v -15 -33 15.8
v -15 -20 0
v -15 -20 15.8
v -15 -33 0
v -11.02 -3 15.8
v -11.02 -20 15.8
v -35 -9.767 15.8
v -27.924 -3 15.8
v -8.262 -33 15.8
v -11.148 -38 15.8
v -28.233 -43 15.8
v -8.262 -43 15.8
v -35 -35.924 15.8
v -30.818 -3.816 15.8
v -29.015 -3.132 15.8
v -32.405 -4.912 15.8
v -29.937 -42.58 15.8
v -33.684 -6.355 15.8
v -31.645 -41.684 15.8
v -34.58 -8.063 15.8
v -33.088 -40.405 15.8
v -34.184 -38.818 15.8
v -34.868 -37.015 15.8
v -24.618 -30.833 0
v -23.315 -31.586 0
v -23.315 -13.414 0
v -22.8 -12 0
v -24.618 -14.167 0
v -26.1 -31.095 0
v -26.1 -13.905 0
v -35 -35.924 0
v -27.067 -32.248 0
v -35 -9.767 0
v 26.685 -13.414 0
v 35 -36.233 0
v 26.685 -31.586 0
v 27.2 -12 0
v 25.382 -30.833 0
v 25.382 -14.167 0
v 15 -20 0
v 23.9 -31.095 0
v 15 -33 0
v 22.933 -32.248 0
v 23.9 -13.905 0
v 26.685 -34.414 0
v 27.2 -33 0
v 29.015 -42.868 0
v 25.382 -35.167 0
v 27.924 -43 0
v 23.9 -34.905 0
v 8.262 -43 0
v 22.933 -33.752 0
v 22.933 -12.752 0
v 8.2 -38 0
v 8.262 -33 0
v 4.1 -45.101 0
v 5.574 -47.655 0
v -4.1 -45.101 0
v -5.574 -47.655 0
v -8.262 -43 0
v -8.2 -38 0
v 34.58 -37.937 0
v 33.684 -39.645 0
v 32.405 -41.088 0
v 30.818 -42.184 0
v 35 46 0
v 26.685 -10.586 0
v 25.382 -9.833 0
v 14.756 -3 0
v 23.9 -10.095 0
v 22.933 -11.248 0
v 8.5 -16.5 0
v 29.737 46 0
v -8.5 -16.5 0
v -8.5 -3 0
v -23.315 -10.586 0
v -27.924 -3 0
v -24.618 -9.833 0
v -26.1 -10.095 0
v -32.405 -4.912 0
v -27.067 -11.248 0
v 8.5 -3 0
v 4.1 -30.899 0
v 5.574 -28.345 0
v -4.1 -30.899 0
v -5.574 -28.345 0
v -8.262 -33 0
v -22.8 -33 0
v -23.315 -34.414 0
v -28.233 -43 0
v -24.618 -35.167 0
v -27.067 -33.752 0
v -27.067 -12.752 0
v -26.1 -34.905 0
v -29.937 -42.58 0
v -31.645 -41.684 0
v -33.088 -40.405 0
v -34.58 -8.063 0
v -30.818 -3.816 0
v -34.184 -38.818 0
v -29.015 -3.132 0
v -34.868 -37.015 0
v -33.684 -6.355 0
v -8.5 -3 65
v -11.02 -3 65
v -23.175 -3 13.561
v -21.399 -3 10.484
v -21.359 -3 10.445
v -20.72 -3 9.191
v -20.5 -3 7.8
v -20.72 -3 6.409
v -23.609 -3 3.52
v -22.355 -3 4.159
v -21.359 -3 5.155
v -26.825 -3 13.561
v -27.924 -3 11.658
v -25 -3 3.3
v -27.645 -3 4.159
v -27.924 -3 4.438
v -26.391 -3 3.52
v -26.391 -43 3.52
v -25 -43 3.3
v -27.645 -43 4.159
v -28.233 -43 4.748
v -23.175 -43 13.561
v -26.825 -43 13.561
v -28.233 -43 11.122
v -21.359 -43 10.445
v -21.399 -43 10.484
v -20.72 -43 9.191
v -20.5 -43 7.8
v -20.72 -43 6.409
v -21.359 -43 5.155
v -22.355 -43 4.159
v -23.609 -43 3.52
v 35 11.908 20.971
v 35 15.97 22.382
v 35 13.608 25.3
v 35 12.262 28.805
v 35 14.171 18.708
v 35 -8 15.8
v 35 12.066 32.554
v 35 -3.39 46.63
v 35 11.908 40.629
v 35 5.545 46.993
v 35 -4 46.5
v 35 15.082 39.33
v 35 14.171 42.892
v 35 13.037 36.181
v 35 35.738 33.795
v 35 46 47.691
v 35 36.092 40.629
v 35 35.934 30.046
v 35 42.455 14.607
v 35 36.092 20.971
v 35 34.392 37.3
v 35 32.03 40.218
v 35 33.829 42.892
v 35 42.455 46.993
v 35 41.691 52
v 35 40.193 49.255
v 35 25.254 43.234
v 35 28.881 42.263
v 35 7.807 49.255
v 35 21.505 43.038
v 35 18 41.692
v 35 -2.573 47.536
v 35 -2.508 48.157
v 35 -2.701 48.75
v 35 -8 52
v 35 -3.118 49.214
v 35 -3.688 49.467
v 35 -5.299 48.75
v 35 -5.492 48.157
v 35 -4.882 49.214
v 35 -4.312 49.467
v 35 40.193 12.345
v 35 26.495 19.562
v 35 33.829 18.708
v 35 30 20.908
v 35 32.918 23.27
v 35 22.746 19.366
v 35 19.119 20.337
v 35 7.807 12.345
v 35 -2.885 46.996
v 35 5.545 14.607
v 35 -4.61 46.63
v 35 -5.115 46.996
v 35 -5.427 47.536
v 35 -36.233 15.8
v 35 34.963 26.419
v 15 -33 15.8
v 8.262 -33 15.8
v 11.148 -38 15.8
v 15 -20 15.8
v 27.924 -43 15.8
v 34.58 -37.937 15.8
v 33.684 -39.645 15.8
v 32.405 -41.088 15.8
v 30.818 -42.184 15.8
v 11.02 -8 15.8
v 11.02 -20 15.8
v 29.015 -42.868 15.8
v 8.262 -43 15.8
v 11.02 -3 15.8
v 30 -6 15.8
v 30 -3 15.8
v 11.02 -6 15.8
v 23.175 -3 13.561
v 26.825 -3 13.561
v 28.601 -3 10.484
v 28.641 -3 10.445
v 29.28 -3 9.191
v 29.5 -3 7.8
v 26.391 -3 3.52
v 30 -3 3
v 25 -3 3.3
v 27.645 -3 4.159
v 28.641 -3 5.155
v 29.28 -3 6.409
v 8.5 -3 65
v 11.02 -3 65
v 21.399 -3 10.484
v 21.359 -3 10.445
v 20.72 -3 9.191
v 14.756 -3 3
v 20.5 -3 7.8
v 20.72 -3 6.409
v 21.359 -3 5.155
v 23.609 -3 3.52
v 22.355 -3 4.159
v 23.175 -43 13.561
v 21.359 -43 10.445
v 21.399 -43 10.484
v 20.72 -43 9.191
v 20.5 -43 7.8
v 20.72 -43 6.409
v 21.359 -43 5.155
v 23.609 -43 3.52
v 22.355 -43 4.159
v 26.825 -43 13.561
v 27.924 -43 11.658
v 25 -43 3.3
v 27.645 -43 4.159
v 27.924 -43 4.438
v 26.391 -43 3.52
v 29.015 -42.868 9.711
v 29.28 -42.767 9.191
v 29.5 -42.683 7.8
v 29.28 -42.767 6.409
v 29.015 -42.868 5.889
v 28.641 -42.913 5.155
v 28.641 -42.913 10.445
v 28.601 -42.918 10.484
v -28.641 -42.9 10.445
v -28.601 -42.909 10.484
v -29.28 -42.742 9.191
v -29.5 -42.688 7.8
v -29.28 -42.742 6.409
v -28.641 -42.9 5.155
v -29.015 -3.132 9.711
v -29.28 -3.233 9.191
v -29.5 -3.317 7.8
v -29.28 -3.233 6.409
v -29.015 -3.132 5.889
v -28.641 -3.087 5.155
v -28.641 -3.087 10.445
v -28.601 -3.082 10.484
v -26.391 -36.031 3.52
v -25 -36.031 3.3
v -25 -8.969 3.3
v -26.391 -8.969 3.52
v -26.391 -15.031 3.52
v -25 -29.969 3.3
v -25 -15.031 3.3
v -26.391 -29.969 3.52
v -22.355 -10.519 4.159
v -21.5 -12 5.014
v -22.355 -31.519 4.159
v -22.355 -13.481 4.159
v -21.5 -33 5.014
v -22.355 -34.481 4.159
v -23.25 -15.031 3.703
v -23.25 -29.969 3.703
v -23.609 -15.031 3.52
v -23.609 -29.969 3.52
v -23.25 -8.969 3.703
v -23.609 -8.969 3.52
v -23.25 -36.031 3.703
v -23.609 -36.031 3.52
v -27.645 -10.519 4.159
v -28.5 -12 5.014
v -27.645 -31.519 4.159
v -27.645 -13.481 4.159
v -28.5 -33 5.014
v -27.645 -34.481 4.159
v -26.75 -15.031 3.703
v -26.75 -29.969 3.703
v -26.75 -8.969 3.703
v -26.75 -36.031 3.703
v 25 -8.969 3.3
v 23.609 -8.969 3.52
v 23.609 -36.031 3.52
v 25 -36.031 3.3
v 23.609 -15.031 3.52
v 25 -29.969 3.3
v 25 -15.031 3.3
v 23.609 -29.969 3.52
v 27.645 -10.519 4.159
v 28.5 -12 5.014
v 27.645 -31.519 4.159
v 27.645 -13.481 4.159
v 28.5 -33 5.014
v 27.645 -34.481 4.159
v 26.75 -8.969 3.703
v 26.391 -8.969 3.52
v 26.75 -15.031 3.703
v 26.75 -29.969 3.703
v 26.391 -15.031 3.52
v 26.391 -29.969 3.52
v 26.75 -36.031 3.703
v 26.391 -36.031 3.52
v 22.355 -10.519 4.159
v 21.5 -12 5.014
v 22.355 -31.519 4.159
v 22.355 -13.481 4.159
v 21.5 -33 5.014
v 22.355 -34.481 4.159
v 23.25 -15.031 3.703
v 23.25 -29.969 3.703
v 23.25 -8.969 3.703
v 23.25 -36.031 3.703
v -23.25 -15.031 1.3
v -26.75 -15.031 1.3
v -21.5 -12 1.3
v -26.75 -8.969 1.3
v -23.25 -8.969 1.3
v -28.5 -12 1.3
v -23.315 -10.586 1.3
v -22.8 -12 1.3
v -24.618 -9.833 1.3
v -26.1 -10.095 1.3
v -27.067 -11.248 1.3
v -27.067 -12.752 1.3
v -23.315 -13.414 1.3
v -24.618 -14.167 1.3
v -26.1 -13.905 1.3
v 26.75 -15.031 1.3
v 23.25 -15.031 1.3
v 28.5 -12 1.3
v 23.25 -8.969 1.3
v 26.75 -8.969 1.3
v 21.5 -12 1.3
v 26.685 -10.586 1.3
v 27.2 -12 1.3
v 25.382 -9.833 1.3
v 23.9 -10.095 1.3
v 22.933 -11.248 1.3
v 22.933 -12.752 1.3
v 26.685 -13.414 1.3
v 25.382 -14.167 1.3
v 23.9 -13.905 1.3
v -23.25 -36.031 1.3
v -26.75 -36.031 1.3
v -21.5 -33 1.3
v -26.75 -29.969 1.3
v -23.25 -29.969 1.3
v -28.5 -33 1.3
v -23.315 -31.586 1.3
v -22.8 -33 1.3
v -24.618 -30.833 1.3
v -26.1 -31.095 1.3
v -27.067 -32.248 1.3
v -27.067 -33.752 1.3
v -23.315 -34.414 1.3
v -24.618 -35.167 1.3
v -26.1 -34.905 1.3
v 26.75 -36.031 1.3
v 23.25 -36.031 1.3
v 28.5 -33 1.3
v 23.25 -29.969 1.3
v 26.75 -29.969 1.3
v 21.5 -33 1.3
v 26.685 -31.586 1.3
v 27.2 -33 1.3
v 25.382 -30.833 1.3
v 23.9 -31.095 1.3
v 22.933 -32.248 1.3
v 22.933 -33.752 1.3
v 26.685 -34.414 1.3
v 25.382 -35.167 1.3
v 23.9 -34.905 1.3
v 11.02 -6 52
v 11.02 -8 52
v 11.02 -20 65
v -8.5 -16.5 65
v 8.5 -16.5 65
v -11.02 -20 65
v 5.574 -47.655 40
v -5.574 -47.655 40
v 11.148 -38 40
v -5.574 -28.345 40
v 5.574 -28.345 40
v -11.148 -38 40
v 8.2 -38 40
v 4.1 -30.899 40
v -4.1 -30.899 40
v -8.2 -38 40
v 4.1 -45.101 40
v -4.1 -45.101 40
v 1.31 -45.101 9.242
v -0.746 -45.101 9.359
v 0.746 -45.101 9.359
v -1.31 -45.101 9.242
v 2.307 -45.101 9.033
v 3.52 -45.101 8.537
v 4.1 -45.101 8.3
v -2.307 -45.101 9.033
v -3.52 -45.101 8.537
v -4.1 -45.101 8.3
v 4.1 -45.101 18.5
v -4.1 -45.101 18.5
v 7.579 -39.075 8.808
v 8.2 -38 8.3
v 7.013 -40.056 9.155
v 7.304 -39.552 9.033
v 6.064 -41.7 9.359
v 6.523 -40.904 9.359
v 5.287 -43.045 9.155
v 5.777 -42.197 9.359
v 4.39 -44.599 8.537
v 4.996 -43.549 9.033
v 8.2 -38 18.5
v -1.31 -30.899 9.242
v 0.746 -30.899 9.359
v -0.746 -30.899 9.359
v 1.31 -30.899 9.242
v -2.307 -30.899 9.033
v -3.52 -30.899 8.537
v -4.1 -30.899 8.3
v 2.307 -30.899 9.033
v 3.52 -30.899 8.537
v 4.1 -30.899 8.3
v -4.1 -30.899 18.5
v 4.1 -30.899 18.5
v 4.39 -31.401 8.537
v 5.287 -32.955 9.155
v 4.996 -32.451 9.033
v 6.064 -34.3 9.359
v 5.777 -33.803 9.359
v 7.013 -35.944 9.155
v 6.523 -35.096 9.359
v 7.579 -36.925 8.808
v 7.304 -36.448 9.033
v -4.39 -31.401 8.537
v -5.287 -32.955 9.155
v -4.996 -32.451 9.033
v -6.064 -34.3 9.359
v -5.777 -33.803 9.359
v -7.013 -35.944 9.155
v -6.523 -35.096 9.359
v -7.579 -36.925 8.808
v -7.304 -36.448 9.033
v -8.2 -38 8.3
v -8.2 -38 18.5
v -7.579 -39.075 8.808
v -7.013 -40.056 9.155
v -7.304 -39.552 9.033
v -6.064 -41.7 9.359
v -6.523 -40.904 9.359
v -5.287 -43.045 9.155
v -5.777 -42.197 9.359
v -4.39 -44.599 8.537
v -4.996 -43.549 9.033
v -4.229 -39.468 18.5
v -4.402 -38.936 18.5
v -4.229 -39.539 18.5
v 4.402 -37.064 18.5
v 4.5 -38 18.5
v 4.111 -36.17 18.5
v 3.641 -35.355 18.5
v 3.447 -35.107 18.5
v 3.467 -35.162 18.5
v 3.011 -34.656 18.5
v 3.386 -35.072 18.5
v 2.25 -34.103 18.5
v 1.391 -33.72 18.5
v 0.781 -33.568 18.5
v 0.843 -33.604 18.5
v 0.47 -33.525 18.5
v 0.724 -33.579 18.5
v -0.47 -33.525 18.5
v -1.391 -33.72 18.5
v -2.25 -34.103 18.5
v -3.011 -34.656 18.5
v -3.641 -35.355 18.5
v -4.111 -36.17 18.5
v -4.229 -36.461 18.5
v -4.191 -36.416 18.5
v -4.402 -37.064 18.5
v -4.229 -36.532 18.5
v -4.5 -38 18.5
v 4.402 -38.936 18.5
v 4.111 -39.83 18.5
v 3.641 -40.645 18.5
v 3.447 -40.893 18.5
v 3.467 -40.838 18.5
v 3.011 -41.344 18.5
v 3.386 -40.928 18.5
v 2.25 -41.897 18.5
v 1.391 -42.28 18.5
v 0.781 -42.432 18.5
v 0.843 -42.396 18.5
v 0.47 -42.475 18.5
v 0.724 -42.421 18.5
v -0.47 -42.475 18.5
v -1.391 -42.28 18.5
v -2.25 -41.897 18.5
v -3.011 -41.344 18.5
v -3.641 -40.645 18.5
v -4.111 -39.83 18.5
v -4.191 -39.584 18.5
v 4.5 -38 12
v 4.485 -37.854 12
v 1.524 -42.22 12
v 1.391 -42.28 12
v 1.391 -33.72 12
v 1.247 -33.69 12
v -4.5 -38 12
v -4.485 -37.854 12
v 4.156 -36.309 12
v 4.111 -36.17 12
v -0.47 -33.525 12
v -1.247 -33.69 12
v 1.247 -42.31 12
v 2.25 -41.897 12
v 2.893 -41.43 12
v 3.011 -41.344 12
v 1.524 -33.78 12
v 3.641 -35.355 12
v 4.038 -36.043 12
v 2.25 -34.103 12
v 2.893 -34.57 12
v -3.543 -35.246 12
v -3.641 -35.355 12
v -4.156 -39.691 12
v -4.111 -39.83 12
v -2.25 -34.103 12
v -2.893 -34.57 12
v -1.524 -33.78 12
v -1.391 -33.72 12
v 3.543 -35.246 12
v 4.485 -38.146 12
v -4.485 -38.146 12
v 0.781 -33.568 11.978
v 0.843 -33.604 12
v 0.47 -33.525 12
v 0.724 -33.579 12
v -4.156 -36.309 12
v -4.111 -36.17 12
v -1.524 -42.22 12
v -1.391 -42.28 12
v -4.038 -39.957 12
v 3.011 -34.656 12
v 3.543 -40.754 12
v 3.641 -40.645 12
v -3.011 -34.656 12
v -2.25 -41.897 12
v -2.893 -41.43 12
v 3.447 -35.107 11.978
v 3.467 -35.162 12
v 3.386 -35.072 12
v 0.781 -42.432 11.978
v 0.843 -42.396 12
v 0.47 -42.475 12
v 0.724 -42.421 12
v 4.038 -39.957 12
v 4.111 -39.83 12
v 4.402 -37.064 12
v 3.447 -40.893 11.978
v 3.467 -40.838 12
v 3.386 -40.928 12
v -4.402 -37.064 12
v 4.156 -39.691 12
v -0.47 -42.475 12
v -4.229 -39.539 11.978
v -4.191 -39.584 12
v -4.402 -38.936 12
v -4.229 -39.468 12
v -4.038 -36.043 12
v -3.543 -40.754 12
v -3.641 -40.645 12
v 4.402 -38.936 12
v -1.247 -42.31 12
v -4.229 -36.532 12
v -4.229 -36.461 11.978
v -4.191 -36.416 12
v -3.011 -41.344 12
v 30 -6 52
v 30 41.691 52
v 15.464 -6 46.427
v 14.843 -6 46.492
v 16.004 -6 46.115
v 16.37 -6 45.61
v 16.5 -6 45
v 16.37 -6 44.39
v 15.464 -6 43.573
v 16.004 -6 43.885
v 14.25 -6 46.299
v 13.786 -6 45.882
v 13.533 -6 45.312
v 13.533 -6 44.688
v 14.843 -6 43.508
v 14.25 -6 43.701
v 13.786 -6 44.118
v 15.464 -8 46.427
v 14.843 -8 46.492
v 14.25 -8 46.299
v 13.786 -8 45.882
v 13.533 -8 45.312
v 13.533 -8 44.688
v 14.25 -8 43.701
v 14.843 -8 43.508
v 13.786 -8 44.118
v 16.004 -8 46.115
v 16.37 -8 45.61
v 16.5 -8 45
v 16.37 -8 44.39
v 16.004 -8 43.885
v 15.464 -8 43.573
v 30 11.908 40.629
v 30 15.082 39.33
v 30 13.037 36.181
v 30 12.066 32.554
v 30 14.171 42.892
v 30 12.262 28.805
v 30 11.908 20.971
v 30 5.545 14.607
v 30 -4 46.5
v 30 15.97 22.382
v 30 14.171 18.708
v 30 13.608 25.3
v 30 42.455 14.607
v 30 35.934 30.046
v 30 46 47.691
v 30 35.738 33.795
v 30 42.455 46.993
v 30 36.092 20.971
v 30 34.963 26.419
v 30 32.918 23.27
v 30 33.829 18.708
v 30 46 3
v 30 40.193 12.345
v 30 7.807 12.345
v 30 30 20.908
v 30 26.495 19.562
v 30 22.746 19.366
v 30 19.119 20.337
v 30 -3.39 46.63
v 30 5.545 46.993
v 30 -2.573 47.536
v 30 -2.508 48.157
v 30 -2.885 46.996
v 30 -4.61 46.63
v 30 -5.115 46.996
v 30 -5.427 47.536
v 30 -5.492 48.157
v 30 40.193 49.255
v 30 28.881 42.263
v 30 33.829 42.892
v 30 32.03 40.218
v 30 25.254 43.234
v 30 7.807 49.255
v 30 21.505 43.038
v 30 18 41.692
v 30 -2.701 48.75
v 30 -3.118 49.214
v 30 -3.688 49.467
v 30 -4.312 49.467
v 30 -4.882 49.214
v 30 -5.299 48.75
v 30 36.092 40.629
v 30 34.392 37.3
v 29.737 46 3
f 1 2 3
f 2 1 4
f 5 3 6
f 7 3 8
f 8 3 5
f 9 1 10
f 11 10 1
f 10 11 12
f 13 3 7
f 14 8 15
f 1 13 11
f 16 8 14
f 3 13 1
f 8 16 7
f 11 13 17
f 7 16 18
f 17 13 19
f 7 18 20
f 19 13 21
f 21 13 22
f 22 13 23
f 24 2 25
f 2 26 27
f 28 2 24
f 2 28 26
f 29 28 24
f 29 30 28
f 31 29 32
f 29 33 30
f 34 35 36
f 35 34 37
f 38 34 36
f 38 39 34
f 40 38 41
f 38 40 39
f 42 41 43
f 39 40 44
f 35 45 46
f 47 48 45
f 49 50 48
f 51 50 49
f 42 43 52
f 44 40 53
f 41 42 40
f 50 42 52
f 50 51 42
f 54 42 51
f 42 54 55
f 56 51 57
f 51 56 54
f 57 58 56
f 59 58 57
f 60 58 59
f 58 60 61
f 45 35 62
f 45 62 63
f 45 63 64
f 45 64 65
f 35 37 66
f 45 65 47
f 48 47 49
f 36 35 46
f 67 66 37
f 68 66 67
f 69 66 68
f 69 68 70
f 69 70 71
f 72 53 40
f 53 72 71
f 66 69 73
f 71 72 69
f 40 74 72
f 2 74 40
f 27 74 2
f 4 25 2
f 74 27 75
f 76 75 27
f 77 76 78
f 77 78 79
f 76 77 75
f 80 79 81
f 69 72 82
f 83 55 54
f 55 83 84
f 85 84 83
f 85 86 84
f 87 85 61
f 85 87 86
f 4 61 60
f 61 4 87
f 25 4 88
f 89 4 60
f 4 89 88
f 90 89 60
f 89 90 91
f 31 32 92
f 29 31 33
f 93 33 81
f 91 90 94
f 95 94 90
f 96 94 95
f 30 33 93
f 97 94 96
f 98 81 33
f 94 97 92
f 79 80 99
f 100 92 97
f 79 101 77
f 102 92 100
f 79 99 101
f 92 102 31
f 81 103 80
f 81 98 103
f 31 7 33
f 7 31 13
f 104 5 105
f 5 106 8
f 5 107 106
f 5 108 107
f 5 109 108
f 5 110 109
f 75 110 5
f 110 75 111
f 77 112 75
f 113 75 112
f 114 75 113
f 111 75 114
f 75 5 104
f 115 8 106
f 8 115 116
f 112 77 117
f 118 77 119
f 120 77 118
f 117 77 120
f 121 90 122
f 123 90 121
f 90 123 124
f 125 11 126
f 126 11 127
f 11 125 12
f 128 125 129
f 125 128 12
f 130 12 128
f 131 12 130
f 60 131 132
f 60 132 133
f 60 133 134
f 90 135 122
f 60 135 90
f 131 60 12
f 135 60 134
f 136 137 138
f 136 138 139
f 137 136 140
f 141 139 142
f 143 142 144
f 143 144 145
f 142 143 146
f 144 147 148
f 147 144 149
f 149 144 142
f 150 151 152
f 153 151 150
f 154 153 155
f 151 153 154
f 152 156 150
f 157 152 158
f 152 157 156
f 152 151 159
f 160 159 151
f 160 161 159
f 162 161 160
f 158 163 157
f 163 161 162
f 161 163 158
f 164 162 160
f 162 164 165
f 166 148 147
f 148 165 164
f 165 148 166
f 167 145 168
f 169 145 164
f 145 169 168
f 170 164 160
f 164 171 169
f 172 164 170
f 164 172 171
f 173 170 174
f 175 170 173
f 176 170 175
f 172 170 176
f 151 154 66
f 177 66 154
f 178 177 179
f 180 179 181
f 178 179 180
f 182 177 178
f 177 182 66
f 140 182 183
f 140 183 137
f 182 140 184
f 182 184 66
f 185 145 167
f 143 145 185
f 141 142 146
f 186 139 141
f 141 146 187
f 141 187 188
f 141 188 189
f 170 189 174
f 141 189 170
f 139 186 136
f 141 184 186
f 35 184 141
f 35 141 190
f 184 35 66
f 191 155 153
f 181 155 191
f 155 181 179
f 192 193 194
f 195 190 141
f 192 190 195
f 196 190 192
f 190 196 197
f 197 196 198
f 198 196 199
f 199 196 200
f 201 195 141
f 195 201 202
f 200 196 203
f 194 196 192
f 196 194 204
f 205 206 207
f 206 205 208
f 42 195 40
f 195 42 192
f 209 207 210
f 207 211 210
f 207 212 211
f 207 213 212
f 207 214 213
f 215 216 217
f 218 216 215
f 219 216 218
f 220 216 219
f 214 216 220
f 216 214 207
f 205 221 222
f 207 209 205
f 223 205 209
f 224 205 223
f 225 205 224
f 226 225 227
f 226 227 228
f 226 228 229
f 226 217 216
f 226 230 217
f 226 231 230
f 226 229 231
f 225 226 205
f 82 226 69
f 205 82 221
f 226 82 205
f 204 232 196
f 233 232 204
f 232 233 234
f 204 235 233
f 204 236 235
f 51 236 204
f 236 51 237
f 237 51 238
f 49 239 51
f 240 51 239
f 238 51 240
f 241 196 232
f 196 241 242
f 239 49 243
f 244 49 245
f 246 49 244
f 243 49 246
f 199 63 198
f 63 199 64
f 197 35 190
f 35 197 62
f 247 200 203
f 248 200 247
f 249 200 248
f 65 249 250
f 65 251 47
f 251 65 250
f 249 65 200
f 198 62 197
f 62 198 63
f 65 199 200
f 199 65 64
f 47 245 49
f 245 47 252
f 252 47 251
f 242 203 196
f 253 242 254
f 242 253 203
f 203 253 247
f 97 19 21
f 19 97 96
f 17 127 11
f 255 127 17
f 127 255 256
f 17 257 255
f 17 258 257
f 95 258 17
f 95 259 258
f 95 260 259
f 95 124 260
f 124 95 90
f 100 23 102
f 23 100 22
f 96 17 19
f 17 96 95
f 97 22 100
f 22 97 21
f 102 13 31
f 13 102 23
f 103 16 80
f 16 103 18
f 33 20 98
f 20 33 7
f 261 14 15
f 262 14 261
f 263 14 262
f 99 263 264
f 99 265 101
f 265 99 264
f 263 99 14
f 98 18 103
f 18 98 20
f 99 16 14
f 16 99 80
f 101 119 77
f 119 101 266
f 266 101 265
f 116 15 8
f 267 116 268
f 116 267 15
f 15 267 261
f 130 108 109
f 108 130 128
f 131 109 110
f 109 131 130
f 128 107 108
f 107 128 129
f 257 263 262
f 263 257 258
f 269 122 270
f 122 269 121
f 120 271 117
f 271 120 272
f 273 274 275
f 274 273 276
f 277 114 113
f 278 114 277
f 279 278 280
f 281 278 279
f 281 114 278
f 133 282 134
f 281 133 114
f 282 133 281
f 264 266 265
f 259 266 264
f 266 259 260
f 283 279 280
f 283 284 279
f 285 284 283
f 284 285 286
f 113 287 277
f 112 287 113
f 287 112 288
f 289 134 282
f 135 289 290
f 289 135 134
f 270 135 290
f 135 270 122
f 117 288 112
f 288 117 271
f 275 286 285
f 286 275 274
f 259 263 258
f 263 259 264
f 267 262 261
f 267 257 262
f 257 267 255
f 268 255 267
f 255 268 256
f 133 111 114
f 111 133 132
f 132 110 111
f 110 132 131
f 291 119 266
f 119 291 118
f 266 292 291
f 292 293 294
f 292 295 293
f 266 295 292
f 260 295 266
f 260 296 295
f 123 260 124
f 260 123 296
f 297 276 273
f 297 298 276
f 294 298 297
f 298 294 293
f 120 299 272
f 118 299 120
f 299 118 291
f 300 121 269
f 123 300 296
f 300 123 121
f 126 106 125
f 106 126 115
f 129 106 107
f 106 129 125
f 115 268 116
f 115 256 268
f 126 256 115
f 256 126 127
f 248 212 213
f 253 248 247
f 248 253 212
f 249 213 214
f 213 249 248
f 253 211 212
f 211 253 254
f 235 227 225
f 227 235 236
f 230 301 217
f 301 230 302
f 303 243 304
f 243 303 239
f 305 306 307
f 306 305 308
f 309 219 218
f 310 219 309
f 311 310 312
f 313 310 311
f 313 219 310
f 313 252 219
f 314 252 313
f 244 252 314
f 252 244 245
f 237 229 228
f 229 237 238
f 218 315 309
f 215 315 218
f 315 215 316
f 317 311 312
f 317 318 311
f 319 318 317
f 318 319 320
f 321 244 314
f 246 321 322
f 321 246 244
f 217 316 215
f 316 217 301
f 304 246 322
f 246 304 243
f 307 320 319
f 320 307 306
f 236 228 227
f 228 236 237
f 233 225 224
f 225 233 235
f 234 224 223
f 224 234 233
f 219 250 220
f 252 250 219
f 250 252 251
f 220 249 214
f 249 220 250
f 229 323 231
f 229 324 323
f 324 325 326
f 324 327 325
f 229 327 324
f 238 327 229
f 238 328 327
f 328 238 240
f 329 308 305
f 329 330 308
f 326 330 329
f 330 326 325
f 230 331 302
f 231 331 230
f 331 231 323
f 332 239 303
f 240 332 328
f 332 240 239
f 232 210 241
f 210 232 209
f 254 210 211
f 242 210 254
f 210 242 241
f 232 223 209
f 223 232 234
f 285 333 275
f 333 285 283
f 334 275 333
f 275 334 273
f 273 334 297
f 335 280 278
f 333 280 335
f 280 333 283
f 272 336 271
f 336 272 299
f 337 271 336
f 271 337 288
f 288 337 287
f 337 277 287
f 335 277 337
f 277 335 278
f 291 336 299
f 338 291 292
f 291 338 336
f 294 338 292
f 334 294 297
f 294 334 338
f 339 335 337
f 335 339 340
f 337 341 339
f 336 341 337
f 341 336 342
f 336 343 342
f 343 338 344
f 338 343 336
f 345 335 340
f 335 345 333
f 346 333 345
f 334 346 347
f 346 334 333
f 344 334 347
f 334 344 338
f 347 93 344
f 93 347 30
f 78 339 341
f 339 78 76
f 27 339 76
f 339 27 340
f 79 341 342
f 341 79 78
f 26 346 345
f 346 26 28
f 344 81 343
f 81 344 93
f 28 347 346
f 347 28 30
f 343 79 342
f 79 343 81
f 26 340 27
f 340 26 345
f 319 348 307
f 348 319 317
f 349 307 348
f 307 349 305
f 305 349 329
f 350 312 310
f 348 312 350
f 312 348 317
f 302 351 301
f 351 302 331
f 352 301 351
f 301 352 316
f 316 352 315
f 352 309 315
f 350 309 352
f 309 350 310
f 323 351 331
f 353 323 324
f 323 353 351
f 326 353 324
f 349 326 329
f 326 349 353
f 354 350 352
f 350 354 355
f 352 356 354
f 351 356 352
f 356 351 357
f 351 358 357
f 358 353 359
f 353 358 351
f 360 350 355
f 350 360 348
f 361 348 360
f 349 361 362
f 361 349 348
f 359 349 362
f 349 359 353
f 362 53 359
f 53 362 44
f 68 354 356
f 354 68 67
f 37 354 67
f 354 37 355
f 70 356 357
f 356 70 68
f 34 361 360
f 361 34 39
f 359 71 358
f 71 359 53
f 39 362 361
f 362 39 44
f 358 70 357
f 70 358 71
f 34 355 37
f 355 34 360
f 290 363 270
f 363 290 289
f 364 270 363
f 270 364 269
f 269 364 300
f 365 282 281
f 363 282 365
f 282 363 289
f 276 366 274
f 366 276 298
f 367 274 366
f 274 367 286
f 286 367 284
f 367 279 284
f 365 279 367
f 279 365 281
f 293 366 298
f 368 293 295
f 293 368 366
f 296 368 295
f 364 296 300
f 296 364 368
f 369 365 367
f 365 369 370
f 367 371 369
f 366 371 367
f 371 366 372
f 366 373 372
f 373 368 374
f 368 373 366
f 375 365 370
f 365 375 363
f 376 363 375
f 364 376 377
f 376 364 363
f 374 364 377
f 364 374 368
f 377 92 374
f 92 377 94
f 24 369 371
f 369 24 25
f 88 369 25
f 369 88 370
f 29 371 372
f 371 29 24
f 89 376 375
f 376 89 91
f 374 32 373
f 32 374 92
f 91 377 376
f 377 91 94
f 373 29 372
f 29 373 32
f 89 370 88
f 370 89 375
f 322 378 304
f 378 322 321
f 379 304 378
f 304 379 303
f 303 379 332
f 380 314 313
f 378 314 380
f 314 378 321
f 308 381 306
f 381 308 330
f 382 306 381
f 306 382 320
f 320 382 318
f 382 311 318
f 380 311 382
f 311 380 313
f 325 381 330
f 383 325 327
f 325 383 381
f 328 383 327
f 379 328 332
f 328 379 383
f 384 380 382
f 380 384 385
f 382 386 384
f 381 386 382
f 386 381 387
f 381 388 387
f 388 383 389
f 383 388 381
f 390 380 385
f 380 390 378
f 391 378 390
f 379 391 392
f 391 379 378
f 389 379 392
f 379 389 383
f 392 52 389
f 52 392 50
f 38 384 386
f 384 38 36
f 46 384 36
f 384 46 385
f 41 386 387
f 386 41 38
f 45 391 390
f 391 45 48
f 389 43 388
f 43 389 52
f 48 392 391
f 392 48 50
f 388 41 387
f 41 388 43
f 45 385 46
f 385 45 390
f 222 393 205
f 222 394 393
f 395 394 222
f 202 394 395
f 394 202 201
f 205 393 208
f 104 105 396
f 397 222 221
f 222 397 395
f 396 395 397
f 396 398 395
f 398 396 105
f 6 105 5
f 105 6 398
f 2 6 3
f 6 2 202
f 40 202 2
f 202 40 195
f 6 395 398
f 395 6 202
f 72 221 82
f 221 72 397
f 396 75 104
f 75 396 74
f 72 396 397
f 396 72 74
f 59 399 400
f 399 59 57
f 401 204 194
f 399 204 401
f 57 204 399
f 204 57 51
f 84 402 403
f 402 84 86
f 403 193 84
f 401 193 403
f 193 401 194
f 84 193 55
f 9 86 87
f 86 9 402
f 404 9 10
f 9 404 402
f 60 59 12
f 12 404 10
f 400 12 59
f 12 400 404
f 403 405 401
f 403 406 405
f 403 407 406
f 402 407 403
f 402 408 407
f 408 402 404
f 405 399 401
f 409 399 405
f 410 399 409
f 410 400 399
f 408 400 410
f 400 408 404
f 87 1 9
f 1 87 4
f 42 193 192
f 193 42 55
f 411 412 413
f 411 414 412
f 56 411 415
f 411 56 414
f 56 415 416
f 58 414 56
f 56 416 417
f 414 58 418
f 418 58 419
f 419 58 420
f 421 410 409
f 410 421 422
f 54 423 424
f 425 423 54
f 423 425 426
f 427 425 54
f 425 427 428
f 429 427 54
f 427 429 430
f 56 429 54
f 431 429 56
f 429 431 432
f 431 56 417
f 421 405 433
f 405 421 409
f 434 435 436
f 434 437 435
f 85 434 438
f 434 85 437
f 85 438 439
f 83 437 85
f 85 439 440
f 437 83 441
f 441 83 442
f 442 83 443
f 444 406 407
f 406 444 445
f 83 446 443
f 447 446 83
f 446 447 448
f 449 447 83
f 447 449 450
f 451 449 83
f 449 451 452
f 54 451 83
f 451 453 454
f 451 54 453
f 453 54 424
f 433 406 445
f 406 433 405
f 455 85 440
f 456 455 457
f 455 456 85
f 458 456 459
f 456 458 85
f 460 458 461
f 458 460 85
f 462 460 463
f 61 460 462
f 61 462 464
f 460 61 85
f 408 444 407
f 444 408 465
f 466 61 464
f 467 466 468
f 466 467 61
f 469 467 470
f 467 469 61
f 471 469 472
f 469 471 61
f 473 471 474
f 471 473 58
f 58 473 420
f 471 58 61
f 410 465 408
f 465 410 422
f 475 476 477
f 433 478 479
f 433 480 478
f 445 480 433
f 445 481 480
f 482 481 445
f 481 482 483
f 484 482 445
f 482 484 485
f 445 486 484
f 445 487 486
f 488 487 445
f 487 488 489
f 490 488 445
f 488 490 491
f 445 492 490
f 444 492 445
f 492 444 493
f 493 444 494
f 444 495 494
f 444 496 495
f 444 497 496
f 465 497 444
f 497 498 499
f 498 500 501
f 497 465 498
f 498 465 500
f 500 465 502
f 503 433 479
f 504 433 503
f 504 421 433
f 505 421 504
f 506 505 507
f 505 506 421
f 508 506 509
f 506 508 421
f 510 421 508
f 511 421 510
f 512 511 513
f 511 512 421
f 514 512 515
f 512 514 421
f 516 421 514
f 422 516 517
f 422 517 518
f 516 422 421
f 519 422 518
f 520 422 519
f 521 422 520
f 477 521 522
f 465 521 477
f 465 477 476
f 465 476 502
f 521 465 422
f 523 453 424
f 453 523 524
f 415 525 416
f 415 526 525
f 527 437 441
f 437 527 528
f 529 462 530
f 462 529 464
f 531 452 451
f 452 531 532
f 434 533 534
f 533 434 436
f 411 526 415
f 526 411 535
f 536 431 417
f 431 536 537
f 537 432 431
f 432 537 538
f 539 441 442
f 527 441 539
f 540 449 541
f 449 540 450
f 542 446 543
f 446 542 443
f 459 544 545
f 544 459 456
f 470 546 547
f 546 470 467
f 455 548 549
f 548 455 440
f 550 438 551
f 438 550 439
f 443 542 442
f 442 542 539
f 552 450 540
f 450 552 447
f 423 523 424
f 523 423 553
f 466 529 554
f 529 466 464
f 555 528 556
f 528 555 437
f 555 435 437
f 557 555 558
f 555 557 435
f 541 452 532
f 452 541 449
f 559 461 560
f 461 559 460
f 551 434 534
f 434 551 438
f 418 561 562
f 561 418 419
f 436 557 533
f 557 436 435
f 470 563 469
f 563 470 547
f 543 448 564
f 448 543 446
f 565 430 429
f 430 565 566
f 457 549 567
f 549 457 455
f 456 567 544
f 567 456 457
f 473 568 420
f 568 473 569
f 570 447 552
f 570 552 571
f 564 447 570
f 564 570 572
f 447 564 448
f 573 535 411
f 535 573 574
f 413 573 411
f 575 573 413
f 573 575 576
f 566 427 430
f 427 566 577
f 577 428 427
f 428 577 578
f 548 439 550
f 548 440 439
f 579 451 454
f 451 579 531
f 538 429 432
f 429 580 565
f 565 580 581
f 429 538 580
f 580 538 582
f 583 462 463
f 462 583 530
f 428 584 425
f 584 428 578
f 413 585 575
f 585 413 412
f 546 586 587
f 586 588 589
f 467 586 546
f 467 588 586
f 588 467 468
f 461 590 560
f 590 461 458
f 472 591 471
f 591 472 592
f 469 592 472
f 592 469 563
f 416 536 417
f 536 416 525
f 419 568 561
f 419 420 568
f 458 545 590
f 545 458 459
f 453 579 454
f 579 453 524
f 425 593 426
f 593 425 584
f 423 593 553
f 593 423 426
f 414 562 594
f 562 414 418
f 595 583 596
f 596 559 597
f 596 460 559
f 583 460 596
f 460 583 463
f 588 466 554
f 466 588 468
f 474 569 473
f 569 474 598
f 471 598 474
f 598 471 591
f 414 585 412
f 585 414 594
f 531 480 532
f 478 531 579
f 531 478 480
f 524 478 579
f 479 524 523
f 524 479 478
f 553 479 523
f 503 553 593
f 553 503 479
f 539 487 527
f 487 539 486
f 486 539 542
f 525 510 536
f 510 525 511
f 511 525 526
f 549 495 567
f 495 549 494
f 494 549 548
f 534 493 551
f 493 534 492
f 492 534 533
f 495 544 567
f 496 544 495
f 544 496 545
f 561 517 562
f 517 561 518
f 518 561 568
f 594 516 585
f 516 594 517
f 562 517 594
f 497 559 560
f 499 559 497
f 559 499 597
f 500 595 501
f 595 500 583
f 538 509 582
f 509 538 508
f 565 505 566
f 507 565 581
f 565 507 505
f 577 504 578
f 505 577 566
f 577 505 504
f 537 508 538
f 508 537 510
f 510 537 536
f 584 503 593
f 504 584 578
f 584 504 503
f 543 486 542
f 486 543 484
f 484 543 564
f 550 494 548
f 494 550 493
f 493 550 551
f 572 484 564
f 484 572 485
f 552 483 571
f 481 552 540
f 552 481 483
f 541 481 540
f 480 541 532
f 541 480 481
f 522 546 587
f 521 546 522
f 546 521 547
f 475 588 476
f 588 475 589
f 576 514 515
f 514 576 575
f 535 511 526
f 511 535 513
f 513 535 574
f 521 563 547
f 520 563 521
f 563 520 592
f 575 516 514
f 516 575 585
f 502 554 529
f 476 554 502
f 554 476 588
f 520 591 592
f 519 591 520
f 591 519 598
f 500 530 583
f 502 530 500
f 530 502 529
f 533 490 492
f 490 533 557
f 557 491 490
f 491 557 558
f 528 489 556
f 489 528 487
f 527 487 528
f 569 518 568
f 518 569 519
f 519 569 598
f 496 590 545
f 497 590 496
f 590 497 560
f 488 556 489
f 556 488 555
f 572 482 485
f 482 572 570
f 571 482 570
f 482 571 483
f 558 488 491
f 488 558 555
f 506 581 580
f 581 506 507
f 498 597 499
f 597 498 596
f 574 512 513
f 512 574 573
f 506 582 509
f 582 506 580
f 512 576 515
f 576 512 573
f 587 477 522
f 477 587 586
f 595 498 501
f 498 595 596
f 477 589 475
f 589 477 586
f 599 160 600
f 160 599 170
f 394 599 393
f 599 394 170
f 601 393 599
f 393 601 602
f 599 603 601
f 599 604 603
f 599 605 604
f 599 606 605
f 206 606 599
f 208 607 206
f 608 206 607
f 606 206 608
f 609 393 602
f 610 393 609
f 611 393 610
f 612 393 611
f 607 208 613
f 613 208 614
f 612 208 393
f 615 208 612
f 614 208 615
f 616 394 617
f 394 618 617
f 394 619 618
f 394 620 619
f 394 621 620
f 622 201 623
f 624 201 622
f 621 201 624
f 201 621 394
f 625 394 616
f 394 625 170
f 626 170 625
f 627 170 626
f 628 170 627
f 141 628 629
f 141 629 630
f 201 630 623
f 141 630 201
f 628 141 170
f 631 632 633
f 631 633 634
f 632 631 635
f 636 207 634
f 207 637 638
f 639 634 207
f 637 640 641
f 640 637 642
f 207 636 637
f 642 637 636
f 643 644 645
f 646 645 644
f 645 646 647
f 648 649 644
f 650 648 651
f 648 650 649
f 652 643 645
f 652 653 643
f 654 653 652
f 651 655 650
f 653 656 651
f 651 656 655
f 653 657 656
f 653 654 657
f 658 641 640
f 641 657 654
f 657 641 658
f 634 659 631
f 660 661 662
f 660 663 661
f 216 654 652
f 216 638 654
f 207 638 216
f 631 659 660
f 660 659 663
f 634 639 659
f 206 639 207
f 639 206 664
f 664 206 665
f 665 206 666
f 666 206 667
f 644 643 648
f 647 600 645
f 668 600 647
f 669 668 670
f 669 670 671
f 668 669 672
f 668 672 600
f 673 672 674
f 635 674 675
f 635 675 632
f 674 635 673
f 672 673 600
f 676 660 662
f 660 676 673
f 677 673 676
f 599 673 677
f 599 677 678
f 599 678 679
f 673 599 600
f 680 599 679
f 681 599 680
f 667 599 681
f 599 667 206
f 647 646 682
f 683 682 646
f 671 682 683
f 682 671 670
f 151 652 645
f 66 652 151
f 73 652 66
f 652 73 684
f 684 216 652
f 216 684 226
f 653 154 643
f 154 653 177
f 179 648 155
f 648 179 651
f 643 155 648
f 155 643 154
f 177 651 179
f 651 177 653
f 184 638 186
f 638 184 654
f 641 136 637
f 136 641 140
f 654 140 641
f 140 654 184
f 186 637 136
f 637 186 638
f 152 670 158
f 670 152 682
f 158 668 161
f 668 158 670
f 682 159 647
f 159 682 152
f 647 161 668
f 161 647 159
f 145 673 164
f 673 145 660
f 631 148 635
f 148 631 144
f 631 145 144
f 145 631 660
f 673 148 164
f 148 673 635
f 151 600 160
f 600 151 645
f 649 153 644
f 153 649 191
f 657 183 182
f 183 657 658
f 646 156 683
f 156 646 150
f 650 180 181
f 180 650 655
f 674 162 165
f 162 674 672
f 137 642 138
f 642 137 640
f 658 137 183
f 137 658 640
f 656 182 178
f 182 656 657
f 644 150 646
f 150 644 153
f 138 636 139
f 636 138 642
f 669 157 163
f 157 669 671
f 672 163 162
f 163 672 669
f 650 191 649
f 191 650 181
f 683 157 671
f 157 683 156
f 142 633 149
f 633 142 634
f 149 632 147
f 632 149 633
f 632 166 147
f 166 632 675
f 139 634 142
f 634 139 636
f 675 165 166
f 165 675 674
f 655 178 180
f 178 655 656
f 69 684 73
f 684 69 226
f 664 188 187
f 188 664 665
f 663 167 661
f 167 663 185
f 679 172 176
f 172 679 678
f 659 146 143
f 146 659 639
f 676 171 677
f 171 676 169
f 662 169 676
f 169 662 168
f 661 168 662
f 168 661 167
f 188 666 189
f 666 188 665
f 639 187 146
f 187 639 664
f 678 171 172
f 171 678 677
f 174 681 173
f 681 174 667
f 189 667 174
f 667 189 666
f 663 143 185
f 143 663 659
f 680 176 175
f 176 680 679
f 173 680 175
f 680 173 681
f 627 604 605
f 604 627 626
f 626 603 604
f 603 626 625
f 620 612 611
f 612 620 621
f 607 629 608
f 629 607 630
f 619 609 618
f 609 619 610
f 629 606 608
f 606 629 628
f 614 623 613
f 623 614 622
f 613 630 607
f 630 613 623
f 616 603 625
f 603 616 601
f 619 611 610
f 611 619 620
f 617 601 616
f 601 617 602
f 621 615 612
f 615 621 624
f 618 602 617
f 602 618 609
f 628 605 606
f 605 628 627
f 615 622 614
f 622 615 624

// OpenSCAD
// file: ../configuration.scad
// PRUSA Mendel  
// Configuration file
// GNU GPL v2
// Josef Pra
// josefprusa@me.com
// prusadjs.cz
// http://www.reprap.org/wiki/Prusa_Mendel
// http://github.com/prusajr/PrusaMendel


// PLEASE SELECT ONE OF THE CONFIGURATIONS BELOW
// BY UN-COMMENTING IT


variant=0; //0 for metric
//variant=1; //1 for SAE
if(variant==0){
echo("variant: metric");
}else if(variant==1){
echo("variant: sae");
} else{
echo("WARNING: INVALID CONFIGURATION");
}




vars=[
//[m8_dia, m8_nut, m4_dia, m4_nut, m3_dia, m3_nut, bush_dia, mot_shaft, bush_rod, bush_outerdia, bush_length]
[9,16.4,5,9,4.4,7,11,5.3,8,16,11],//metric
[9,15.7,5.5,10.6,5.5,10.6,11.5,5.3,7.9375,16,11]//SAE
];


//BUSHING TYPE Can generate three versions
// 1 - regular old ones
// 2 - helical ones
// 3 - holders for brass or any other bought bushings
bushing_type = 2;


//Round corner diameter
round_corner_diameter = 8;


//Thin wall size
layer_height = 0.4;
perimeter_width_over_thicknes = 1.6;
infill_widht_over_thickness = 1.55;
thin_wall = 2*(perimeter_width_over_thicknes*layer_height+infill_widht_over_thickness*layer_height);
if(thin_wall<2){
	echo("Check thin wall size, its below 2mm!");
}
echo(thin_wall);


//DO NOT TOUCH THIS SECTION!
m8_diameter = vars[variant][0];
m8_nut_diameter = vars[variant][1];
m4_diameter = vars[variant][2];
m4_nut_diameter = vars[variant][3];
m3_diameter = vars[variant][4];
m3_nut_diameter = vars[variant][5];
bushing_diameter = vars[variant][6];
motor_shaft=vars[variant][7];
bushing_rodsize = vars[variant][8];
bushing_outerDiameter = vars[variant][9];
bushing_lenght = vars[variant][10];




// MINI-HUXLEY VERSION (TODO, just place holder)
// include <configuration-huxley.scad>


// MEGA VERSION (TODO, just place holder)
// include <configuration-mega.scad>




// Some basic functions, probably should be somewhere else
module roundcorner(diameter){
	difference(){
		cube(size = [diameter,diameter,99], center = false);
		translate(v = [diameter, diameter, 0]) cylinder(h = 100, r=diameter, center=true);
	}
}
// main file
// PRUSA Mendel  
// X-end with NEMA 17 motor mount
// GNU GPL v2
// Josef Průša
// josefprusa@me.com
// prusadjs.cz
// http://www.reprap.org/wiki/Prusa_Mendel
// http://github.com/prusajr/PrusaMendel

include <../configuration.scad>
corection = 1.17; 

/**
 *@name X end motor
 *@using 2 bushing
 *@using 8 m3x10
 *@using 4 m3xnut
 *@using 4 m3xwasher
 *@using 1 m8spring
 *@using 2 m8nut
 */


module xendmotor(){
difference()
{
translate(v = [0,17,24.5]) union(){
difference(){
union(){
//translate(v = [0, -25, 0]) cube(size = [70,70,5], center = true);
translate(v = [-25, -40, -16.6])cube(size = [20,40,15.8], center = true);
translate(v = [25, -40, -16.6])cube(size = [20,40,15.8], center = true);
}


//nut traps

translate(v = [-25, -29, -19.7]) cylinder(h = 7, r=m3_nut_diameter/2, $fn=6, center=true);
translate(v = [-25, -29, -20]) cylinder(h = 10, r=m3_diameter/2, $fn=9, center=true);
translate(v = [25, -29, -19.7]) cylinder(h = 7, r=m3_nut_diameter/2, $fn=6, center=true);
translate(v = [25, -29, -20]) cylinder(h = 10, r=m3_diameter/2, $fn=9, center=true);

translate(v = [-25, -50, -19.7]) cylinder(h = 7, r=m3_nut_diameter/2, $fn=6, center=true);
translate(v = [-25, -50, -20]) cylinder(h = 10, r=m3_diameter/2, $fn=9, center=true);
translate(v = [25, -50, -19.7]) cylinder(h = 7, r=m3_nut_diameter/2, $fn=6, center=true);
translate(v = [25, -50, -20]) cylinder(h = 10, r=m3_diameter/2, $fn=9, center=true);

//round corners
translate(v = [35.1, -60.1, -25]) rotate(a=[0,0,90]) roundcorner(round_corner_diameter);
translate(v = [-35.1, -60.1, -25]) rotate(a=[0,0,0]) roundcorner(round_corner_diameter);
translate(v = [-35.1, -19.9, -25]) rotate(a=[0,0,-90]) roundcorner(round_corner_diameter);

//holes for axis
translate(v = [-25, -18-22, -16.7]) rotate(a=[90,0,0]) {
	cylinder(h = 42, r=4.5, $fn=20, center=true);
	translate(v = [0, 2.60, 0]) cylinder(h = 42, r=3.65, $fn=6, center=true);
}
translate(v = [25, -18-22, -16.7]) rotate(a=[90,0,0]) {
	cylinder(h = 42, r=4.5, $fn=20, center=true);
	translate(v = [0, 2.60, 0]) cylinder(h = 42, r=3.65, $fn=6, center=true);
}
//slider cutouts
translate(v = [0, -25, 15]) 
	difference(){
	translate(v = [0, -0, -14.5])cube(size = [23,23,50], center = true);
	}
//nut trap
translate(v = [0, -55, 15]) {
	difference(){
	translate(v = [0, -0, -15])cylinder(h = 50, r=m8_nut_diameter/2+thin_wall, $fn=6, center=true);
	}
}
}

//slider
translate(v = [0, -25, 15]) 
	difference(){
union(){
	translate(v = [0, -3.5, -7]) cube(size = [17+2*thin_wall,17,65], center = true);

	translate(v = [0, -3.5, -31.6]) cube(size = [33,17,15.8], center = true);}
	translate(v = [0, -0, -7])cube(size = [17,17,70], center = true);}

//nut trap
translate(v = [0, -55, 15]) {
difference(){
	union(){difference(){
union(){
	translate(v = [0, -0, -19.5])cylinder(h = 40, r=m8_nut_diameter/2+thin_wall*corection, $fn=6, center=true);
	translate(v = [0, 0, -31.6]) cube(size = [35,10,15.8], center = true);}
	cylinder(h = 90, r=m8_nut_diameter/2, $fn=6, center=true);
	}
	
// Generate nut barrier with conical lead in under.  Replace this...

	//translate(v = [10, 0, -31]) cylinder(h = 4, r=m8_nut_diameter/2+thin_wall, $fn=6, center=true);

// ... with this--------
	difference()
	{
	translate(v = [0, 0, -29]) cylinder(h = 16, r=m8_nut_diameter/2+thin_wall, $fn=6, center=true);
	translate(v = [0, 0, -32]) cylinder(h = 10, r1=10+4, r2=4, $fn=30, center=true);
	cylinder(h = 100, r=4.5, $fn=30, center=true);
	}

//---------
	}
	translate(v = [0, 0, 12.5]) cylinder(h = 90, r=m8_diameter/2, $fn=9, center=true);
}
}


//nema17 connector
translate(v = [0, 0, -12]) difference(){
union(){
translate(v = [21, -24.0, 20.5]) cube(size = [24,2,38], center = true); // Changed to a web
translate(v = [32.5, 2, 13.5]) cube(size = [5,54,52], center = true);
translate(v = [22.5, 2, -11]) cube(size = [20,54,3], center = true);}

// some reduction of bottom part 
translate(v = [15, 15, -11]) rotate ([0,0,-17]) cube(size = [20,70,25], center = true);

translate(v = [0, 0, -4.7]){
	translate(v = [32.5, 7, 23.5]) rotate(a=[0,90,0]) rotate(a=[0,0,30]) cylinder(h = 10, r=12, $fn=20, center=true);

translate(v = [30, 7, 23]) rotate(a=[0,90,0]){rotate ([0,0,45]) translate([20,0,0]) cube(size = [9,3.2,25], center = true);
rotate ([0,0,-45]) translate([20,0,0]) cube(size = [9,3.2,25], center = true);
rotate ([0,0,135]) translate([20,0,0]) cube(size = [9,3.2,25], center = true);
rotate ([0,0,-135]) translate([20,0,0]) cube(size = [9,3.2,25], center = true);

rotate ([0,0,135]) translate([32,0,0]) cube(size = [9,20,25], center = true);


}
}
}}
// Cable support holes
translate([30, -4, 48]) rotate([0,90,0])cylinder(h = 20, r=1.5, $fn=15, center=true);
translate([15, -4, 45]) rotate([90,0,0])cylinder(h = 20, r=1.5, $fn=15, center=true);
}
}
xendmotor();
